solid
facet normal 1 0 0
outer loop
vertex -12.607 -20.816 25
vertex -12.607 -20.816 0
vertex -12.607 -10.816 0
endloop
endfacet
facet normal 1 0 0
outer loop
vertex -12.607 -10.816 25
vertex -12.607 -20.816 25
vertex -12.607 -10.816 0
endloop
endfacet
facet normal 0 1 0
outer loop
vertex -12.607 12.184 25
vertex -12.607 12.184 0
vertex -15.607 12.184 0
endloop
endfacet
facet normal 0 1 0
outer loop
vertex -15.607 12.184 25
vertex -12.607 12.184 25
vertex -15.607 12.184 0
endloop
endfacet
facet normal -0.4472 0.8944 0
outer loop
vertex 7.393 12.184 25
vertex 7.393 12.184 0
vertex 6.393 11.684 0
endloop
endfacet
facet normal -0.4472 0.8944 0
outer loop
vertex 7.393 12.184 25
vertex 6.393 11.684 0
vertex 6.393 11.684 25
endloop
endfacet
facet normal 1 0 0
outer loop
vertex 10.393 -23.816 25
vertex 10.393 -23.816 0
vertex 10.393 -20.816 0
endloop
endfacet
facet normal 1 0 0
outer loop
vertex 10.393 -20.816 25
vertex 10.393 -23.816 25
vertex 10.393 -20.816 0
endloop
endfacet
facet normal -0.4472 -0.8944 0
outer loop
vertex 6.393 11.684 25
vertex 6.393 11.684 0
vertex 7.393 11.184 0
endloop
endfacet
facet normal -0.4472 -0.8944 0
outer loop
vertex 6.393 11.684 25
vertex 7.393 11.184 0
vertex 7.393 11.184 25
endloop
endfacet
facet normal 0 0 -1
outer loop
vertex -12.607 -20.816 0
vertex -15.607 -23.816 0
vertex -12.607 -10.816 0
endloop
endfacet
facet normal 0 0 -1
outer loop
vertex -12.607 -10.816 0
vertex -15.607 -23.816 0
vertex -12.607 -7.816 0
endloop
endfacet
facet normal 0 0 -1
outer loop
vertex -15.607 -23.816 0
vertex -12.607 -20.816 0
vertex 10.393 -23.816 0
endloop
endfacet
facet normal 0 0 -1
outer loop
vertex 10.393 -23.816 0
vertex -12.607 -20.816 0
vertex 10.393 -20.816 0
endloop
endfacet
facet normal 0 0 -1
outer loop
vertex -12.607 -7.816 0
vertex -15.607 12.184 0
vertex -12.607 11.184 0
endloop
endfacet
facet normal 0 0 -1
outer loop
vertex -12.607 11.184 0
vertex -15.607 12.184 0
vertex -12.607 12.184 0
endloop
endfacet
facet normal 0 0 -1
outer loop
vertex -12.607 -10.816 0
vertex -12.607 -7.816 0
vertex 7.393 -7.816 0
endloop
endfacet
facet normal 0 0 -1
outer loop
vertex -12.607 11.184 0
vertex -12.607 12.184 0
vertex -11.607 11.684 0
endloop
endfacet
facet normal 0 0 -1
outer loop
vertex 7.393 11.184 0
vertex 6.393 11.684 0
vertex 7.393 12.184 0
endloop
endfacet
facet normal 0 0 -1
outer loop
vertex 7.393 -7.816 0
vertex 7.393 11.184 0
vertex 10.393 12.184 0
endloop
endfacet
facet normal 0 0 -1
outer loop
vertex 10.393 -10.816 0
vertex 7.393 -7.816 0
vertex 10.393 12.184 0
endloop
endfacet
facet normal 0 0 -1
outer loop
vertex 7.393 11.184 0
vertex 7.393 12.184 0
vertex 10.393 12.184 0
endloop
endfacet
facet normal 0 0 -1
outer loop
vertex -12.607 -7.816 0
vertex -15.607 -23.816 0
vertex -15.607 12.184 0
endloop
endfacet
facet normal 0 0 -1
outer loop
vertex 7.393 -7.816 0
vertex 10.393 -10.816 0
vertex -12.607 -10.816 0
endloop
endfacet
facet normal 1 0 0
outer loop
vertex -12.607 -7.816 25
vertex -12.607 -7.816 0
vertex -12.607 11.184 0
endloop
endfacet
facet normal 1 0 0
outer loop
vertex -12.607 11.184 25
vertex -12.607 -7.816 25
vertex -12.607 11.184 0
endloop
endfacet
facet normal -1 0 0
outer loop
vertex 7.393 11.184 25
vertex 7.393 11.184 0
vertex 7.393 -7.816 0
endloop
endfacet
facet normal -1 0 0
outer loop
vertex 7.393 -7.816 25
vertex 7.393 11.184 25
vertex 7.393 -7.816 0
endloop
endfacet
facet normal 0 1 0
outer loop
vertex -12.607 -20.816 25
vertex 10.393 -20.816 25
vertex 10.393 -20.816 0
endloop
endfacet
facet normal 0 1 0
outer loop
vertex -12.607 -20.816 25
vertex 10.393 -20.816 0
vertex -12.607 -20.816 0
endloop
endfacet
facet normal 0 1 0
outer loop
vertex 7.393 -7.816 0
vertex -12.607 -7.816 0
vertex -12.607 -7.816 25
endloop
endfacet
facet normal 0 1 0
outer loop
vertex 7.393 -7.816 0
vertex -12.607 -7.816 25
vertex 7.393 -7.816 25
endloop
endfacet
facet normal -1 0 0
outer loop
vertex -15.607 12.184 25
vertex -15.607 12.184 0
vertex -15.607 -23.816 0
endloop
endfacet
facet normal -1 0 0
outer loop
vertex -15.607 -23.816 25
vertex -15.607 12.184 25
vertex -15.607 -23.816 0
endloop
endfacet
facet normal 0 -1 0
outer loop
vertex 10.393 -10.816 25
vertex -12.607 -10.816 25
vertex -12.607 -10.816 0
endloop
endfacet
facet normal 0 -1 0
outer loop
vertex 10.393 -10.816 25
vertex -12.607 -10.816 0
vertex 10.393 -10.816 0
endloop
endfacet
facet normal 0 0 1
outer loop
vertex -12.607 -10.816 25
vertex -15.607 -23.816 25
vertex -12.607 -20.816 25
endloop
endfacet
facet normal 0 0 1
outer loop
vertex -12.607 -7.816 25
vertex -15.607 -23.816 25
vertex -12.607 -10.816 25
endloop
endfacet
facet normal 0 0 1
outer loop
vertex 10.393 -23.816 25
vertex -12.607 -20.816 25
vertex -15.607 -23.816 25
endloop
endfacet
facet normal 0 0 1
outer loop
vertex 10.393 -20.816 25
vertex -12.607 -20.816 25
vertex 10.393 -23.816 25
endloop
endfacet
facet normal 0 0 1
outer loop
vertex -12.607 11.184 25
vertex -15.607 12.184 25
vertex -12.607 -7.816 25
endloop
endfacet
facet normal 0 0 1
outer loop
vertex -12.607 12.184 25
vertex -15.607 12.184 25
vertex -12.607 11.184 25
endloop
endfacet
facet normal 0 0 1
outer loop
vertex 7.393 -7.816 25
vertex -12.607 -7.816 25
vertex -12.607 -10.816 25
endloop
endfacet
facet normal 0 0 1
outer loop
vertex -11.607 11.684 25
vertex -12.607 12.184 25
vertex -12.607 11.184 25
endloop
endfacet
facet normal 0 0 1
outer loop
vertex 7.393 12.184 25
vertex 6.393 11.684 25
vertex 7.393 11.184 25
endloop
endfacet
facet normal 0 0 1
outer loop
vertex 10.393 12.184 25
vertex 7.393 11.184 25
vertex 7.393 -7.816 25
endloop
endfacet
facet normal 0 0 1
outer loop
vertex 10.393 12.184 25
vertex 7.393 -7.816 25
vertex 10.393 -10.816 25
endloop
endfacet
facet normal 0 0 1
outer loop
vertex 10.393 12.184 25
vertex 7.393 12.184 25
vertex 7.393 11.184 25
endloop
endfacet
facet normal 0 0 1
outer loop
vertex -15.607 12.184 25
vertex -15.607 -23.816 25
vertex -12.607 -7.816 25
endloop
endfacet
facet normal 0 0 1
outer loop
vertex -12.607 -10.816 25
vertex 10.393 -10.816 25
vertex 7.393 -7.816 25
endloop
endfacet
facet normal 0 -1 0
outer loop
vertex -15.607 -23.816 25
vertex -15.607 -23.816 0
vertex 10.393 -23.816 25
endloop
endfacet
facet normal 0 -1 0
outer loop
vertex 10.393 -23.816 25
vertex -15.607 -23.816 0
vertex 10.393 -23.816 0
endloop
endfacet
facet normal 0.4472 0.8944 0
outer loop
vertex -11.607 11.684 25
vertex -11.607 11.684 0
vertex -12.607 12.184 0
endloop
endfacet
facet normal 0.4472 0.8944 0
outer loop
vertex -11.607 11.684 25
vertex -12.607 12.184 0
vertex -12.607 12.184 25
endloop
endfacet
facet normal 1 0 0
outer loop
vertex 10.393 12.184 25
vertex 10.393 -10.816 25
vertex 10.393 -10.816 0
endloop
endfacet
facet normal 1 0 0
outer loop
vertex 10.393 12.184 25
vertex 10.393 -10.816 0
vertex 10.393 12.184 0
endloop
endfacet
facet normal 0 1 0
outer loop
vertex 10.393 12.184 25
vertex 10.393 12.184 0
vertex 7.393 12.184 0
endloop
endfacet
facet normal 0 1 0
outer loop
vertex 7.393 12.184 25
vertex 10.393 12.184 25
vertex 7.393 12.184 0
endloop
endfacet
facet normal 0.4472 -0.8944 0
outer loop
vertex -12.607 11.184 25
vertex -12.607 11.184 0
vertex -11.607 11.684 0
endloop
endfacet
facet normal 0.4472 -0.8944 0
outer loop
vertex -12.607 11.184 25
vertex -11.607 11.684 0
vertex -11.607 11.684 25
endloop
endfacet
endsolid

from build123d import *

# Parameters (mm, degrees)
F0_W       = 1
F0_H       = 1
F0_W_2     = 20
F0_H_2     = 3
F0_W_3     = 3
F0_H_3     = 10
F1_DEPTH   = 25
F2_SIZE2   = 0.49999
F2_SIZE    = 0.99999
F2_2_SIZE2 = 0.5
F2_2_SIZE  = 1
F3_SIZE2   = 1
F3_SIZE    = 0.5
F3_2_SIZE2 = 0.99999
F3_2_SIZE  = 0.49999


# Not quite as in the source:
# - a fillet or chamfer is up to 0.001 mm smaller than in the source, because OpenCascade refuses the exact size


with BuildPart() as f1:
    # F0 (on Top) → F1 (new body)
    with BuildSketch(Plane.XY):
        Polygon((-12.6065595312, 12.1843403429), (-15.6065595312, 12.1843403429), (-15.6065595312, -10.8156596571), (-12.6065595312, -10.8156596571), (-12.6065595312, -7.8156596571), (-12.6065595312, 11.1843403429), align=None)
        with Locations((-12.1065595312, 11.6843403429)):
            Rectangle(F0_W, F0_H)
        with Locations((-2.6065595312, -9.3156596571)):
            Rectangle(F0_W_2, F0_H_2)
        Polygon((7.3934404688, -7.8156596571), (7.3934404688, -10.8156596571), (10.3934404688, -10.8156596571), (10.3934404688, 12.1843403429), (7.3934404688, 12.1843403429), (7.3934404688, 11.1843403429), align=None)
        with Locations((-14.1065595312, -15.8156596571)):
            Rectangle(F0_W_3, F0_H_3)
        Polygon((-12.6065595312, -20.8156596571), (-15.6065595312, -20.8156596571), (-15.6065595312, -23.8156596571), (10.3934404688, -23.8156596571), (10.3934404688, -20.8156596571), align=None)
        with Locations((6.8934404688, 11.6843403429)):
            Rectangle(F0_W, F0_H)
    extrude(amount=F1_DEPTH)

    # F2 (size 1 and 0.5 in the source; OpenCascade refuses exactly that, so slightly less here)
    f2_edges = [f1.edges().sort_by_distance(p)[0] for p in [
        (6.39344, 11.18434, 12.5),
    ]]
    f2_side = f1.faces().sort_by_distance((6.89344, 11.18434, 12.5))[0]
    chamfer(f2_edges, length=F2_SIZE, length2=F2_SIZE2, reference=f2_side)

    # F2#2
    f2_2_edges = [f1.edges().sort_by_distance(p)[0] for p in [
        (-11.60656, 12.18434, 12.5),
    ]]
    f2_2_side = f1.faces().sort_by_distance((-13.60656, 12.18434, 12.5))[0]
    chamfer(f2_2_edges, length=F2_2_SIZE, length2=F2_2_SIZE2, reference=f2_2_side)

    # F3
    f3_edges = [f1.edges().sort_by_distance(p)[0] for p in [
        (6.39344, 12.18434, 12.5),
    ]]
    f3_side = f1.faces().sort_by_distance((6.39344, 11.934335, 12.5))[0]
    chamfer(f3_edges, length=F3_SIZE, length2=F3_SIZE2, reference=f3_side)

    # F3#2 (size 0.5 and 1 in the source; OpenCascade refuses exactly that, so slightly less here)
    f3_2_edges = [f1.edges().sort_by_distance(p)[0] for p in [
        (-11.60656, 11.18434, 12.5),
    ]]
    f3_2_side = f1.faces().sort_by_distance((-11.60656, 11.43434, 12.5))[0]
    chamfer(f3_2_edges, length=F3_2_SIZE, length2=F3_2_SIZE2, reference=f3_2_side)


solid = f1.part
